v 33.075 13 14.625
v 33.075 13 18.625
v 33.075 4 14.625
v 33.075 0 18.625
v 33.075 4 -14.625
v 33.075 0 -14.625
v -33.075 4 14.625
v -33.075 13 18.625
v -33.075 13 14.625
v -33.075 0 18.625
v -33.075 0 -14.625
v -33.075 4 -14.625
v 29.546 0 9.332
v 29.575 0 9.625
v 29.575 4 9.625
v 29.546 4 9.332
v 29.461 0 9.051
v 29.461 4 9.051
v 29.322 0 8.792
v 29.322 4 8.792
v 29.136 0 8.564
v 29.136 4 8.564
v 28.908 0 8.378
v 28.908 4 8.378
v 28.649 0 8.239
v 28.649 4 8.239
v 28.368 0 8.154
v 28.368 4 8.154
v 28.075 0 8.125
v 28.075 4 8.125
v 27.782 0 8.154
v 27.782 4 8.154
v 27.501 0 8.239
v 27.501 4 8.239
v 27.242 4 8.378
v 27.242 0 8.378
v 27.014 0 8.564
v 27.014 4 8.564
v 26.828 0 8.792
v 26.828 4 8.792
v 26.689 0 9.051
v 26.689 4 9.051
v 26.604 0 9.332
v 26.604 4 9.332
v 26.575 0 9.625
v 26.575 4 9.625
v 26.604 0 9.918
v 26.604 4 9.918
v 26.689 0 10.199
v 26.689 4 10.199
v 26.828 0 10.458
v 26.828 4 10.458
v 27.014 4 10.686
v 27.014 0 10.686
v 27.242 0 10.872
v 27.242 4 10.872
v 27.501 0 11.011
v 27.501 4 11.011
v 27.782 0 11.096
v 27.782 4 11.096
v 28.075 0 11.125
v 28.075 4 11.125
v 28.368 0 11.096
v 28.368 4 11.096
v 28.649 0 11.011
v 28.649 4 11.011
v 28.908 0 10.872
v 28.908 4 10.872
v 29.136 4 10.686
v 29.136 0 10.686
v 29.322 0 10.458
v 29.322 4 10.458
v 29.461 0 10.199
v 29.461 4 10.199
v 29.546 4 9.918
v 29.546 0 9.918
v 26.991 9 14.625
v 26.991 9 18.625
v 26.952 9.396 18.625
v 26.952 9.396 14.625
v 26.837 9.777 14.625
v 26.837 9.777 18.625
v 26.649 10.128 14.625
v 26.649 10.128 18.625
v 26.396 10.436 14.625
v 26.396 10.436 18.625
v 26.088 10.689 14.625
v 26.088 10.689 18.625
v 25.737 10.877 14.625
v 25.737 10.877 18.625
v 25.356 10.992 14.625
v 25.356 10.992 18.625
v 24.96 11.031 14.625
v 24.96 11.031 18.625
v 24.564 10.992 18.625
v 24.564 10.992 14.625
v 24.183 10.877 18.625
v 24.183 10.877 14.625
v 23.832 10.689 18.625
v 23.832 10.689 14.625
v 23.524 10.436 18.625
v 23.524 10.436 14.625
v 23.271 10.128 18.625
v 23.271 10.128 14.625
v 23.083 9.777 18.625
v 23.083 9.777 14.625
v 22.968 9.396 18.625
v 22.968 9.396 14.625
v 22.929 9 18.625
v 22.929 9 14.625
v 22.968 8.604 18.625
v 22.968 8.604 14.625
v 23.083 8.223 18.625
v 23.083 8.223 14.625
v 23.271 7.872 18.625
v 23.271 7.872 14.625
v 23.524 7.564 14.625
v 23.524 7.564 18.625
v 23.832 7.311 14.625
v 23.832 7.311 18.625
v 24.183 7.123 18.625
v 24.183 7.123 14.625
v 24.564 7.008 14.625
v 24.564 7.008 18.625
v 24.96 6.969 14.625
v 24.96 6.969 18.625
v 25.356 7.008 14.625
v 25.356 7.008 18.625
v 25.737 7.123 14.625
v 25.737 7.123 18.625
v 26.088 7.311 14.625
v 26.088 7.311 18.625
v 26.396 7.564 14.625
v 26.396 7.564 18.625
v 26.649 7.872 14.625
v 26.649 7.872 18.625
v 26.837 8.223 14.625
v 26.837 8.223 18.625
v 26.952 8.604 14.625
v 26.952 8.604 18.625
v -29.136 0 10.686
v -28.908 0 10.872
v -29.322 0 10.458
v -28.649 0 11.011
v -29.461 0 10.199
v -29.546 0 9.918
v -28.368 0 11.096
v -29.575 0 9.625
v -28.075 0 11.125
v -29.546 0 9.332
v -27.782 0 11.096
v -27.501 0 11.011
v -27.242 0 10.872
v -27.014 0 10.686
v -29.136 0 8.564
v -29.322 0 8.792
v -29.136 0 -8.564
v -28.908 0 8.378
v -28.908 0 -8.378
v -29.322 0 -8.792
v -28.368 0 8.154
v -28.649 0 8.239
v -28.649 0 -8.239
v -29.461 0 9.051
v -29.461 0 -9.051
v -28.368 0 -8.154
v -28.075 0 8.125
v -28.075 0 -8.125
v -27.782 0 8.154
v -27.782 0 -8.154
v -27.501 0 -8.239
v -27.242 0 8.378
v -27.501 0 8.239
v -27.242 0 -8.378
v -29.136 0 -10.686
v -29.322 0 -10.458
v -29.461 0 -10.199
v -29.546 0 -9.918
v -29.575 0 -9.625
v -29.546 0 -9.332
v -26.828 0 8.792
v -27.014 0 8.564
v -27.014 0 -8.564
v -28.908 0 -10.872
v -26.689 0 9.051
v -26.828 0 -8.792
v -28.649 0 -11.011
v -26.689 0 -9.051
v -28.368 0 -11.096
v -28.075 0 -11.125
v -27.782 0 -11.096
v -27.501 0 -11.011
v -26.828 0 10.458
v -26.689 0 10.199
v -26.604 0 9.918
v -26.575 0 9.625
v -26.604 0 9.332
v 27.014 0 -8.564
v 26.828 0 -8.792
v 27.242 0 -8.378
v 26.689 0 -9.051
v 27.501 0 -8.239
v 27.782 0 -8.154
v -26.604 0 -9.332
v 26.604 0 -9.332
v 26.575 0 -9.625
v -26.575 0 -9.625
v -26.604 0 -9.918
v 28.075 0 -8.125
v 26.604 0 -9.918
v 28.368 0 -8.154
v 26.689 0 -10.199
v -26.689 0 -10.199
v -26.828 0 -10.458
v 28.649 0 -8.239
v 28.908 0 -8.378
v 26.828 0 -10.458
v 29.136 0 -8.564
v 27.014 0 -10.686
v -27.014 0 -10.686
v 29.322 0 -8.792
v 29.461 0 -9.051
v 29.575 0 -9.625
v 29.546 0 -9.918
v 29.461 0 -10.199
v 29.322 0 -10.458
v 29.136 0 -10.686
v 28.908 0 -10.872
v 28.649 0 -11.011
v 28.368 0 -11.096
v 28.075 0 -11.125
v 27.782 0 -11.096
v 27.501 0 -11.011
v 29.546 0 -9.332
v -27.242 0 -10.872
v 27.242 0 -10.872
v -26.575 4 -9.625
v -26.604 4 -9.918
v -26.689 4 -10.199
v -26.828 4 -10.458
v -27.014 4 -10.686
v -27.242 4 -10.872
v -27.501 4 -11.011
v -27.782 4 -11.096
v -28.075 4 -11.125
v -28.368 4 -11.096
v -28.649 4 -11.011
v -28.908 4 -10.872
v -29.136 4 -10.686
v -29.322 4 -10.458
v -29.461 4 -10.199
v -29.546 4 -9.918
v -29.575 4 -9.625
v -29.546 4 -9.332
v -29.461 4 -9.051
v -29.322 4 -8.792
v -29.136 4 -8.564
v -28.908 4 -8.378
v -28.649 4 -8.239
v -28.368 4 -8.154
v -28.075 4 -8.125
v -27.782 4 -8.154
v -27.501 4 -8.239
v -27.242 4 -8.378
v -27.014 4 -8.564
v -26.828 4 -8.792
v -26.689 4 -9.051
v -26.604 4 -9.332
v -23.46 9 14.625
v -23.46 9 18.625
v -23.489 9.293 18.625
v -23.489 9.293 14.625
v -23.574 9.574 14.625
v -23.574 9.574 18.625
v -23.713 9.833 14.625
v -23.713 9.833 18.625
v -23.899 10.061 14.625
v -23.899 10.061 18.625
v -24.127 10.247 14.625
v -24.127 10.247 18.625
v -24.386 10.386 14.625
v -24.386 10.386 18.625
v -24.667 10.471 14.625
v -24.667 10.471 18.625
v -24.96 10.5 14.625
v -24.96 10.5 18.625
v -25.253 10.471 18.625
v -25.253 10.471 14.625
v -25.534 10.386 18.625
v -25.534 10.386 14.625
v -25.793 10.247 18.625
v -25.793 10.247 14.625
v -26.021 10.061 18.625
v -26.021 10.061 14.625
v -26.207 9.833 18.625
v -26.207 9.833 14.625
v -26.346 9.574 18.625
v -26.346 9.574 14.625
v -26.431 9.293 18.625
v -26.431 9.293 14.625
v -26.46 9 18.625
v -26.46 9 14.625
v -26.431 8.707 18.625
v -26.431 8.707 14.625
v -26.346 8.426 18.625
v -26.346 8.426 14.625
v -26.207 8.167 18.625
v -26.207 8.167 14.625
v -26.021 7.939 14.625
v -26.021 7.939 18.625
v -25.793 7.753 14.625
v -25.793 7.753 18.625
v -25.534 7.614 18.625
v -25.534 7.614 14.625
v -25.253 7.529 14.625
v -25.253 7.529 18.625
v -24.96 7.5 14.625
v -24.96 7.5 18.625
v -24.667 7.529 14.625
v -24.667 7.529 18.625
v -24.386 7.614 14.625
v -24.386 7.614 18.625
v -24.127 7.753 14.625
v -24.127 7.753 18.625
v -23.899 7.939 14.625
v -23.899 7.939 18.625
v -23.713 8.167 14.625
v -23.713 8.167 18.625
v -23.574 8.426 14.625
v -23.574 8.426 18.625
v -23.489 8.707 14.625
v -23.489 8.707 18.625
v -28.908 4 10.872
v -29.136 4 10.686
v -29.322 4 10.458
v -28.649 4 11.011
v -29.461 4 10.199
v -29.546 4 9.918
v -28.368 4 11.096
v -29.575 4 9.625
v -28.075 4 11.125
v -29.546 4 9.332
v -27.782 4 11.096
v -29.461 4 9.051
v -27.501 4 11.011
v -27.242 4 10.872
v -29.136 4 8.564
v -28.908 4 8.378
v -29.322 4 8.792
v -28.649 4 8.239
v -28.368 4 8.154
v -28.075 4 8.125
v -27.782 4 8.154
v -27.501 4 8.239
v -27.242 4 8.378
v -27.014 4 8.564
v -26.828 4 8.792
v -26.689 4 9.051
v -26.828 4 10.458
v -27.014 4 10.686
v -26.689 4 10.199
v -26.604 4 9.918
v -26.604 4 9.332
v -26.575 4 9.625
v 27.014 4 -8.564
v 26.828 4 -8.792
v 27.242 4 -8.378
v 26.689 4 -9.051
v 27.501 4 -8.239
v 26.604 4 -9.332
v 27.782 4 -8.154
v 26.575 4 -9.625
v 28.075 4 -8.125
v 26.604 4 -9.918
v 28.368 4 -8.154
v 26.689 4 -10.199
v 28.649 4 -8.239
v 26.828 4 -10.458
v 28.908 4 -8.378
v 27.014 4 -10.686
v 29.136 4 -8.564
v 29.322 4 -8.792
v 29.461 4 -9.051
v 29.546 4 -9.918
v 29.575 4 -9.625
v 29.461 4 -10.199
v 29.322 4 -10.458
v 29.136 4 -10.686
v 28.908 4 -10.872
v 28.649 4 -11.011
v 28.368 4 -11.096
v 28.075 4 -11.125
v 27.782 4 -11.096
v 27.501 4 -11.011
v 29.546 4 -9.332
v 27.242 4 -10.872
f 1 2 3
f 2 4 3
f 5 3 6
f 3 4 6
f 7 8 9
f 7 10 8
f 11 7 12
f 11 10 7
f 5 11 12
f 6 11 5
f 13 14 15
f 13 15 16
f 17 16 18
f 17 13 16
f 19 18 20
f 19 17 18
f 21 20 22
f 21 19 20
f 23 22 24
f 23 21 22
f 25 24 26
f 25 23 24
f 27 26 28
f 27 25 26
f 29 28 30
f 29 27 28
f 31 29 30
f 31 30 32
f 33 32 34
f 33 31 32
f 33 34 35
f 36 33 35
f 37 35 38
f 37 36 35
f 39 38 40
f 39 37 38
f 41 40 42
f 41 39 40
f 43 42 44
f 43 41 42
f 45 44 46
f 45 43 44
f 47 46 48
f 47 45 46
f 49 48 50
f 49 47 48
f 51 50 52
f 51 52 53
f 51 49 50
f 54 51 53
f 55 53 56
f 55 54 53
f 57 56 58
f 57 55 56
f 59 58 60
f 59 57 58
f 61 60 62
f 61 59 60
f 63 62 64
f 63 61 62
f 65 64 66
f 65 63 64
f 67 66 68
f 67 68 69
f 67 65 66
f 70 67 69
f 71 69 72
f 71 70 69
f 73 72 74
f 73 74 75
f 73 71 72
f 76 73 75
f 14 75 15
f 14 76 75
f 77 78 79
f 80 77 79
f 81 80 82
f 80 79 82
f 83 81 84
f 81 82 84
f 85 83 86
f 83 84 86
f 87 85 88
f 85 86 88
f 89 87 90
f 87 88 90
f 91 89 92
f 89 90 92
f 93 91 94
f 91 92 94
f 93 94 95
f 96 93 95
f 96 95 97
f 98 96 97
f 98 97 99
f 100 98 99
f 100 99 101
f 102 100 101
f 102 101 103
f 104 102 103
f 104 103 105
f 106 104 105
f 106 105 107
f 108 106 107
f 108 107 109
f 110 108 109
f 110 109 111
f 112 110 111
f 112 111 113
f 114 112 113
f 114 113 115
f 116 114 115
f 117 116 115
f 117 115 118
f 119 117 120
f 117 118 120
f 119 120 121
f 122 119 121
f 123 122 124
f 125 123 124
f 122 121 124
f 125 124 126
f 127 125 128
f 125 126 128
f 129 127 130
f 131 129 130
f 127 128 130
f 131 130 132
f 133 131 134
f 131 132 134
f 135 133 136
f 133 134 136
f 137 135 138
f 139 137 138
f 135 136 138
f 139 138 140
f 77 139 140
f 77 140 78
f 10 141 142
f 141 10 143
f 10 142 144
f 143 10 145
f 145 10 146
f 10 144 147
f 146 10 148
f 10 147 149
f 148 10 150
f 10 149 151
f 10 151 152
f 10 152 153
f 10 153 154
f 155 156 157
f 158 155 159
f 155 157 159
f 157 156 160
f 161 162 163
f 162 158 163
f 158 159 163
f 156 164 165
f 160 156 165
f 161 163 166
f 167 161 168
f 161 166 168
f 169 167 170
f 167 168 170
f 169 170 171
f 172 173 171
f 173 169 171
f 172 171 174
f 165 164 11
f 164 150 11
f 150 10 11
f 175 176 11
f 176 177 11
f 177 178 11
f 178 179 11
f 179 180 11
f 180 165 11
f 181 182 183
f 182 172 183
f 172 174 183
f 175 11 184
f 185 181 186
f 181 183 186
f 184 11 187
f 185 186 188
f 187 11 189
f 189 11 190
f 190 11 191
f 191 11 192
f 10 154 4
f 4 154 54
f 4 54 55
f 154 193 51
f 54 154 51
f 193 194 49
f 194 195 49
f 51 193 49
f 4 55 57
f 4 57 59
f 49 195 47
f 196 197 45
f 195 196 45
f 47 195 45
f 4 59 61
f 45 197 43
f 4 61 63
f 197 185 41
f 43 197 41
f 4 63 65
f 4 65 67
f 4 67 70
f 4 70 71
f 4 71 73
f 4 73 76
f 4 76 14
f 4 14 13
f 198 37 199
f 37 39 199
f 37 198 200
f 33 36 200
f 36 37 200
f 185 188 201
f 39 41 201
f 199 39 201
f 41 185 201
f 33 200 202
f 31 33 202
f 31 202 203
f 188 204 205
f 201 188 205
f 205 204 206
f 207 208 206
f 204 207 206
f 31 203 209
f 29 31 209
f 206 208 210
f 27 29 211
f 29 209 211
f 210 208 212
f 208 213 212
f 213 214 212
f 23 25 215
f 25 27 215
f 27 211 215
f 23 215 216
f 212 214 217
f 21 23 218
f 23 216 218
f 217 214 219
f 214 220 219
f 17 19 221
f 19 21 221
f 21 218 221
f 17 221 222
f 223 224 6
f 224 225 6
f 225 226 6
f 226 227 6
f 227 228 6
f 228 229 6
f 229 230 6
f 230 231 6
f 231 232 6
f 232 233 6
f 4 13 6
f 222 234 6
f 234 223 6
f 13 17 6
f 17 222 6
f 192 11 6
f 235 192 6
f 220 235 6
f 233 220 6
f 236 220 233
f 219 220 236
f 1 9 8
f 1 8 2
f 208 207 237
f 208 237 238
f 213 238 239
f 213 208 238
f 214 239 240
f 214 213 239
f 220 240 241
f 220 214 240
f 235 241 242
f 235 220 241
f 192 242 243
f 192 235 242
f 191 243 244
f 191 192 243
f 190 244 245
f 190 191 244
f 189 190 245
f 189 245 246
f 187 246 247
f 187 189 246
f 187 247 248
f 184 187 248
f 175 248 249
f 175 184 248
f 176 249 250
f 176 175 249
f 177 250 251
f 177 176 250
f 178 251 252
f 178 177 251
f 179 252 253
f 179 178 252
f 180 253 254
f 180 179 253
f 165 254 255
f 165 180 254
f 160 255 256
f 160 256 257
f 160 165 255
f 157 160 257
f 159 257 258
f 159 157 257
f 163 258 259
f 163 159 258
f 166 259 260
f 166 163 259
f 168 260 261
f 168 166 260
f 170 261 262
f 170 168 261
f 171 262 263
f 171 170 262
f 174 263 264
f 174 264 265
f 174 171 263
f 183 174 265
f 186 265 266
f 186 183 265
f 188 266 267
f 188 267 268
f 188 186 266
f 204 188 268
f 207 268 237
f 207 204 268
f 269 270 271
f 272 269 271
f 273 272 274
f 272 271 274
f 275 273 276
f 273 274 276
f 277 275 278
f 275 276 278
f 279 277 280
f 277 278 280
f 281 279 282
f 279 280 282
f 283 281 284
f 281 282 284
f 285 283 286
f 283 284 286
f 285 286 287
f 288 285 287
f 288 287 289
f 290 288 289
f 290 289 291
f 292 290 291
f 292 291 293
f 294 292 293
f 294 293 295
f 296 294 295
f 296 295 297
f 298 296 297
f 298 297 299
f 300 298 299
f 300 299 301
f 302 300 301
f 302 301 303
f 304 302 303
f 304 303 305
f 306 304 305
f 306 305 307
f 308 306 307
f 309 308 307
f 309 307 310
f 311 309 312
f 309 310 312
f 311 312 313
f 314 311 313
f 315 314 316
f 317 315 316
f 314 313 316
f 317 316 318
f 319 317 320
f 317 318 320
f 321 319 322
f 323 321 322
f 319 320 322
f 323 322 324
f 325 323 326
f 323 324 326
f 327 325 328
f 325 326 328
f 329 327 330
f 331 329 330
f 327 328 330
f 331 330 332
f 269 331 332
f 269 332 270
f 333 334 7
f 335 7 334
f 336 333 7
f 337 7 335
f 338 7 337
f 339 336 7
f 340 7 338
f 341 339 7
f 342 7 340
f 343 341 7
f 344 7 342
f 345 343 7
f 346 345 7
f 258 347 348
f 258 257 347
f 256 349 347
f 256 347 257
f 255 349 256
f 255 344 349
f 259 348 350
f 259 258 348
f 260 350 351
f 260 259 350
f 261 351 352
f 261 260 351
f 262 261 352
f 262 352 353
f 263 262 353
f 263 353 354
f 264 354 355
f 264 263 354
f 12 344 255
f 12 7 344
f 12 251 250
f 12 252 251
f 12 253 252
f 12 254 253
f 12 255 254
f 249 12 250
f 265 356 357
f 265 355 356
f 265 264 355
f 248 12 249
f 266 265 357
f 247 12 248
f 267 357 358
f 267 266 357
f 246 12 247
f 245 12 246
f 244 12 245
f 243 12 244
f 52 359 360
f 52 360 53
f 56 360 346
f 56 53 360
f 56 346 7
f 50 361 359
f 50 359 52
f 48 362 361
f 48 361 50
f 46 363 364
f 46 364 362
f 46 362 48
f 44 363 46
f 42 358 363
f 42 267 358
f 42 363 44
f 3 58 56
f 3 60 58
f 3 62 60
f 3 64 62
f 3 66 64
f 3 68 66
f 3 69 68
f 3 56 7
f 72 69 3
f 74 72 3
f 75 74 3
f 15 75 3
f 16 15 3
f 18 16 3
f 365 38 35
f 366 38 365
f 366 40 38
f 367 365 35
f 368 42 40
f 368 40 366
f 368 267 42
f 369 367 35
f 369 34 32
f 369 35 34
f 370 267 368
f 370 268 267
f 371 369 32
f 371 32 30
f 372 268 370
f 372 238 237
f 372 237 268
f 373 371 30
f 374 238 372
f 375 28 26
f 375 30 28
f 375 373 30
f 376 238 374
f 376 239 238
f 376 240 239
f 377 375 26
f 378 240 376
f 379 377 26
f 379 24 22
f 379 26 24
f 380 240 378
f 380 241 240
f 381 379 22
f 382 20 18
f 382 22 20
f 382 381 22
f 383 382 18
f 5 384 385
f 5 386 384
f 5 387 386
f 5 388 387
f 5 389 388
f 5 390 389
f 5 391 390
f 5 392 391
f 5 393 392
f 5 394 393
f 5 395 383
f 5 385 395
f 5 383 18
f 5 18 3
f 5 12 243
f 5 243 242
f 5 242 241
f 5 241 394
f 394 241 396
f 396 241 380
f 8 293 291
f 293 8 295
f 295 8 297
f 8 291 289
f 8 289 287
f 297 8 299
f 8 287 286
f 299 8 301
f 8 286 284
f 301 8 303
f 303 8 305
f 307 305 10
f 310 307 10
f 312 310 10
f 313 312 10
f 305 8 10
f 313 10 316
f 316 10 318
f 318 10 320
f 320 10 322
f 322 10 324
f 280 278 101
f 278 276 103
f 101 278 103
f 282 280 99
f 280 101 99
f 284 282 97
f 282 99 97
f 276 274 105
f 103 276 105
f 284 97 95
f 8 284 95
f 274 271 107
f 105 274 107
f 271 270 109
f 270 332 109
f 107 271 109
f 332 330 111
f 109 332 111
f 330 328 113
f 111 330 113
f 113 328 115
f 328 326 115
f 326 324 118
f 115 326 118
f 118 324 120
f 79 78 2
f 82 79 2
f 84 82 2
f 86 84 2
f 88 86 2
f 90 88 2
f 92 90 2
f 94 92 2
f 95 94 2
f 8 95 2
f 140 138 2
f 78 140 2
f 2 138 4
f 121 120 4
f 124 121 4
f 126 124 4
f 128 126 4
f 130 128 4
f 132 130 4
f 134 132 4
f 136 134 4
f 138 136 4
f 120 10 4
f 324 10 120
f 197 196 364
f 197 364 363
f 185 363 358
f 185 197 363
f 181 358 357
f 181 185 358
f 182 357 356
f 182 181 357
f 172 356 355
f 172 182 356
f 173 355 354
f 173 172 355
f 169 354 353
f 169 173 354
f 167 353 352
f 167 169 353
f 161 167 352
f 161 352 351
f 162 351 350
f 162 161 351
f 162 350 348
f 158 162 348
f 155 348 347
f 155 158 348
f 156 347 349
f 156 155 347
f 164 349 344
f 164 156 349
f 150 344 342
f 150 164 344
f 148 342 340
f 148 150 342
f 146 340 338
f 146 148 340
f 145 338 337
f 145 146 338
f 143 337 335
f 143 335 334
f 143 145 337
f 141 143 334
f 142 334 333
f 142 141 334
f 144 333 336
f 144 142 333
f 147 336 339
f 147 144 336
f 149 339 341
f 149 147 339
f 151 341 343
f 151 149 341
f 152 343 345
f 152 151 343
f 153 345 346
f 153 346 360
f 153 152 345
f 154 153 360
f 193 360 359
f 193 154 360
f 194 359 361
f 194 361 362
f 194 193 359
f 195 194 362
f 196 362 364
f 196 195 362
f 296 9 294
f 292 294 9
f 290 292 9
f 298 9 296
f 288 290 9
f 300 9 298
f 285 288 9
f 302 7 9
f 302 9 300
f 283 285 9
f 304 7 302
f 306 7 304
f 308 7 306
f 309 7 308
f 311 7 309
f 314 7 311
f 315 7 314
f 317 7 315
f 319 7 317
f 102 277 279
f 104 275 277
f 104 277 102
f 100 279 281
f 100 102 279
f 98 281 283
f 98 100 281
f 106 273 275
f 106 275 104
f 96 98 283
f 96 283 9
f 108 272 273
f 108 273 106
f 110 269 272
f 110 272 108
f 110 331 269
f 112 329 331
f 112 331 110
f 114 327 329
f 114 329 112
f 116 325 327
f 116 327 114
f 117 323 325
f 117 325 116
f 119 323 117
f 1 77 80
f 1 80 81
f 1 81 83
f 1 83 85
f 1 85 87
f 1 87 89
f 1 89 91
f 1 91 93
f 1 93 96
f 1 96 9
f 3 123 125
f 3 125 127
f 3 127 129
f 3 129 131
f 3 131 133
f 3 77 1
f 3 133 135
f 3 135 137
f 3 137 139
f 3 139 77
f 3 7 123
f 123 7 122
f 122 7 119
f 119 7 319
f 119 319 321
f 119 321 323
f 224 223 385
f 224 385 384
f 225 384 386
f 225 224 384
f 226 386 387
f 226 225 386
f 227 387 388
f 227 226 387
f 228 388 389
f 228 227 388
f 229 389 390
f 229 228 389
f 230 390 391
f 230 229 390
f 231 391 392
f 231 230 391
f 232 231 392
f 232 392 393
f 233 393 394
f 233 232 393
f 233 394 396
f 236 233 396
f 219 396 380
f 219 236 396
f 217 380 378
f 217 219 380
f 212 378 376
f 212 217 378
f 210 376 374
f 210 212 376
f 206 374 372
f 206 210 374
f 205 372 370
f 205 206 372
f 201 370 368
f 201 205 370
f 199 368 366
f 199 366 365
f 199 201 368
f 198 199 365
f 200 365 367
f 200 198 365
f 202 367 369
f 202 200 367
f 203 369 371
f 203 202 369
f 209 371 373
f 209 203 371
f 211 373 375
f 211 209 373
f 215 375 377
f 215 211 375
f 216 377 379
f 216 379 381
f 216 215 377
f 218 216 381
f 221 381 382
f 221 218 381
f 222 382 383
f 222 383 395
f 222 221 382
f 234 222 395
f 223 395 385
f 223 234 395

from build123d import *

# Parameters (mm, degrees)
SKETCH1_W           = 66.15
SKETCH1_H           = 4
SKETCH1_H_2         = 29.25
SKETCH1_R           = 1.5
BOSS_EXTRUDE1_DEPTH = 4
BOSS_EXTRUDE2_START = 4
SKETCH1_3_W         = 66.15
SKETCH1_3_H         = 4
BOSS_EXTRUDE2_DEPTH = 9
SKETCH2_R           = 1.5
SKETCH2_R_2         = 2.031128953
CUT_EXTRUDE1_DEPTH  = 9


with BuildPart() as part:
    # Sketch1 → Boss-Extrude1 (new body)
    with BuildSketch(Plane(origin=(0, 0, 0), x_dir=(1, 0, 0), z_dir=(0, 1, 0))):
        with Locations((0, -16.625)):
            Rectangle(SKETCH1_W, SKETCH1_H)
        Rectangle(SKETCH1_W, SKETCH1_H_2)
        with Locations((28.075, 9.625)):
            Circle(SKETCH1_R, mode=Mode.SUBTRACT)
        with Locations((28.075, -9.625)):
            Circle(SKETCH1_R, mode=Mode.SUBTRACT)
        with Locations((-28.075, -9.625)):
            Circle(SKETCH1_R, mode=Mode.SUBTRACT)
        with Locations((-28.075, 9.625)):
            Circle(SKETCH1_R, mode=Mode.SUBTRACT)
    extrude(amount=BOSS_EXTRUDE1_DEPTH)

    # Sketch1<3> → Boss-Extrude2 (add)
    with BuildSketch(Plane(origin=(0, 0, 0), x_dir=(1, 0, 0), z_dir=(0, 1, 0)).offset(BOSS_EXTRUDE2_START)):
        with Locations((0, -16.625)):
            Rectangle(SKETCH1_3_W, SKETCH1_3_H)
    extrude(amount=BOSS_EXTRUDE2_DEPTH)

    # Sketch2 → Cut-Extrude1 (cut)
    with BuildSketch(Plane.XY.offset(18.625)):
        with Locations((-24.96, 9)):
            Circle(SKETCH2_R)
        with Locations((24.96, 9)):
            Circle(SKETCH2_R_2)
    extrude(amount=-CUT_EXTRUDE1_DEPTH, mode=Mode.SUBTRACT)


solid = part.part
